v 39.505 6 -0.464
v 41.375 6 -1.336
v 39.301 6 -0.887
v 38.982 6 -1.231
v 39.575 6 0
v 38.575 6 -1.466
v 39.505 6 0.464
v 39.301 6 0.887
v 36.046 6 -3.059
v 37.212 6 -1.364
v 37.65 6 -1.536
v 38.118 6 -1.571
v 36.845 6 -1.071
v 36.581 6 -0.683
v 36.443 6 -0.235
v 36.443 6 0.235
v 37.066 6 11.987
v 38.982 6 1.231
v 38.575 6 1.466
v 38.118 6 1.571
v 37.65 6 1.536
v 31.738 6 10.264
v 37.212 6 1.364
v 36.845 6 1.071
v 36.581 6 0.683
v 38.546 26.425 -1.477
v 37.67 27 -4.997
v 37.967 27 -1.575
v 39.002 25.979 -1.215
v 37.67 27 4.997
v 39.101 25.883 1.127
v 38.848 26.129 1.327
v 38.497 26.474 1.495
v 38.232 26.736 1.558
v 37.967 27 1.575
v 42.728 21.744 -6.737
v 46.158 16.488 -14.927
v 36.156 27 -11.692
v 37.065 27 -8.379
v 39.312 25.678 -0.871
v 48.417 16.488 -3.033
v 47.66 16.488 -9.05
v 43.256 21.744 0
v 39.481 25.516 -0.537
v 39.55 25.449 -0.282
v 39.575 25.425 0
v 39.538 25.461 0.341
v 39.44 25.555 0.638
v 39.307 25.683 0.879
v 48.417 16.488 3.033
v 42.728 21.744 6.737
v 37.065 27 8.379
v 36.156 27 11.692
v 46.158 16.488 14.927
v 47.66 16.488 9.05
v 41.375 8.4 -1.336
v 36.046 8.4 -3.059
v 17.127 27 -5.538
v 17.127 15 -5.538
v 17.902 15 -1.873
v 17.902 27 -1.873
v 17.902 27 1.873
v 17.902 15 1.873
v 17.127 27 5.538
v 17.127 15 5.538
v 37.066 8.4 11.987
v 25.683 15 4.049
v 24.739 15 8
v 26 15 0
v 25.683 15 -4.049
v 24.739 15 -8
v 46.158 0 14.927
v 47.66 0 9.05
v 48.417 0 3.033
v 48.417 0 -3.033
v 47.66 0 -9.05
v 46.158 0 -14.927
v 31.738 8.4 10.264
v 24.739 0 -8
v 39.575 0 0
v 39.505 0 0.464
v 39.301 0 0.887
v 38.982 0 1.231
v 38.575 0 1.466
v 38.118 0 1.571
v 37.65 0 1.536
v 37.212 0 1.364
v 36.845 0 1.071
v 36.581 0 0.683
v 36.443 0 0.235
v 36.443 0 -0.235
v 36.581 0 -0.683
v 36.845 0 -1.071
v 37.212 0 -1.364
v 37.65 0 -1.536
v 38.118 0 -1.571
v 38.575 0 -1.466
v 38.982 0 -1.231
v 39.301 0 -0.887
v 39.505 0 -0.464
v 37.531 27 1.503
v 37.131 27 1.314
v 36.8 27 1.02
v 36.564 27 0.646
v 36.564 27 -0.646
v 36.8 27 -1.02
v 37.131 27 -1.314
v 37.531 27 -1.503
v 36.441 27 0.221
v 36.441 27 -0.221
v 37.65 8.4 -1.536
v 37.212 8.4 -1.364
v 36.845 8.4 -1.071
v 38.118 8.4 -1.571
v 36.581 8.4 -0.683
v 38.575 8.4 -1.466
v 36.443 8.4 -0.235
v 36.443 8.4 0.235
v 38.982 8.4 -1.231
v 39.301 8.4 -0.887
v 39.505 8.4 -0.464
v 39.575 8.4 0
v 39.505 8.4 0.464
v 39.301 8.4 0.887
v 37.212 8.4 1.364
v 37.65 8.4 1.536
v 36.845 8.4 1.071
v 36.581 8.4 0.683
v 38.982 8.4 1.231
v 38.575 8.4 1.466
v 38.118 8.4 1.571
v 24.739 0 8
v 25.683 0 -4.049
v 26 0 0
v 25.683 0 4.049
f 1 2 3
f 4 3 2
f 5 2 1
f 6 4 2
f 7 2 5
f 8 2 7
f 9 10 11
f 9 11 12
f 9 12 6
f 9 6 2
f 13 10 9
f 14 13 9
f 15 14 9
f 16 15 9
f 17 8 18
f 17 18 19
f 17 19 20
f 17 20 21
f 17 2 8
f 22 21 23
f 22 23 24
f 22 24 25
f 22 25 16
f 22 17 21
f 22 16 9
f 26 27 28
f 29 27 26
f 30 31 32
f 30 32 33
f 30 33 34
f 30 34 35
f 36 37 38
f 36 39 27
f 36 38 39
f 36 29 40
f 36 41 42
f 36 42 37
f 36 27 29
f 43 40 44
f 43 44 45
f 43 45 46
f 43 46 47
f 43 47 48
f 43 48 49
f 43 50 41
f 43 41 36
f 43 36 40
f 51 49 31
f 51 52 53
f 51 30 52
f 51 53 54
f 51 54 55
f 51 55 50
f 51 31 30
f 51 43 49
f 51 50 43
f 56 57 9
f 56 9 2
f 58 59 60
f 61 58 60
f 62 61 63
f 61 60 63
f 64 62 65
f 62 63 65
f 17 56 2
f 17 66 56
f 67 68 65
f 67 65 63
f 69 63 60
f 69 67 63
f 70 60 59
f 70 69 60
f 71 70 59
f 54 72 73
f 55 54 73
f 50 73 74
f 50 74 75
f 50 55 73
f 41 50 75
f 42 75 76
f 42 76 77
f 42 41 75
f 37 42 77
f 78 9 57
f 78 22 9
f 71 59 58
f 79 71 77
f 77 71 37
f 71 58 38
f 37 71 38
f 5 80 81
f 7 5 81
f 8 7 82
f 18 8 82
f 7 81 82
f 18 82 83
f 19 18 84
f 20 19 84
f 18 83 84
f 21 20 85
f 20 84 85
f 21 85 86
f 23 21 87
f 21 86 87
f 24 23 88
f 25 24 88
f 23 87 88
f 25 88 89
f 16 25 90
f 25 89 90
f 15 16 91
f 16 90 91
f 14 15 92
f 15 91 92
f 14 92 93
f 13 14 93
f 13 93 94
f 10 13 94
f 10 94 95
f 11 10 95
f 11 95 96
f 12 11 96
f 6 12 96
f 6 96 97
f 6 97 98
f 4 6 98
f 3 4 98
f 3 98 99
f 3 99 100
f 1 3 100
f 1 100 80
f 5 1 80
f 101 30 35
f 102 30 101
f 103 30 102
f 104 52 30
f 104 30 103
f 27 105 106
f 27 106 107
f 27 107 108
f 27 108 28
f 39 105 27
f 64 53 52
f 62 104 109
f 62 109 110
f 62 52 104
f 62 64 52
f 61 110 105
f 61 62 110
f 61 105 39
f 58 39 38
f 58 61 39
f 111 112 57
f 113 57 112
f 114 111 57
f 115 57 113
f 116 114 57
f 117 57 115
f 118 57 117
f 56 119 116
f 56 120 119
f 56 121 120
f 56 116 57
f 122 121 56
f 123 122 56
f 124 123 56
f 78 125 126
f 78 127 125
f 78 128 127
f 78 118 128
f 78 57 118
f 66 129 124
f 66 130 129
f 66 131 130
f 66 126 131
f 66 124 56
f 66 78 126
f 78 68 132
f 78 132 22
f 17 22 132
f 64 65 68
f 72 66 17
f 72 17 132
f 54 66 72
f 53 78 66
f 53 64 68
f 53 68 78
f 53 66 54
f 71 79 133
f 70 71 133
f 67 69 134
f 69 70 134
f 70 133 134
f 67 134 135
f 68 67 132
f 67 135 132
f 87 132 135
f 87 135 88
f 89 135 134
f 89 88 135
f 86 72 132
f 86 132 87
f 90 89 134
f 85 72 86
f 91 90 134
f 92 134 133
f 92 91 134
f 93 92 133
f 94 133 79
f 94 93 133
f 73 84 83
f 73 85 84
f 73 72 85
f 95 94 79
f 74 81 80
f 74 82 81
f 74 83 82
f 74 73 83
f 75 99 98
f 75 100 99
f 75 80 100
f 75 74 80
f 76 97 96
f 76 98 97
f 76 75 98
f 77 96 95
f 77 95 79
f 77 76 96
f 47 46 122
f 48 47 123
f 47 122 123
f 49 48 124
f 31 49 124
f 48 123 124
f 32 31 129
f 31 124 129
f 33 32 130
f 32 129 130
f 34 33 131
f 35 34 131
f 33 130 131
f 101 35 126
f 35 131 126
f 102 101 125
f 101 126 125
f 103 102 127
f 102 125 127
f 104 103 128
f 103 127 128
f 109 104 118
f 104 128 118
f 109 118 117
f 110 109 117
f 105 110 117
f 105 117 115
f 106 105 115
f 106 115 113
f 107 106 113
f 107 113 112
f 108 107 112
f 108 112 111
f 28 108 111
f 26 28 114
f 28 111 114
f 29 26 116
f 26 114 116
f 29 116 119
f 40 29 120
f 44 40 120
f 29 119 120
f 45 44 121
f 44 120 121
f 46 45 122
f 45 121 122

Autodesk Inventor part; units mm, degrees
ref_plane "YZ Plane" through (0, 0, 0) normal (1, 0, 0) x (0, 1, 0)
ref_plane "XZ Plane" through (0, 0, 0) normal (0, 1, 0) x (-1, 0, 0)
ref_plane "XY Plane" through (0, 0, 0) normal (0, 0, 1) x (1, 0, 0)
sketch "Эскиз3" plane through (0, 0, 0) normal (0, 0, 1) x (1, 0, 0)
  line L0 (26, 0) -> (48.5118, 0)
  line L1 (48.5118, 0) -> (48.5118, 16.4882)
  line L2 (26, 15) -> (18, 15)
  line L3 (18, 15) -> (18, 27)
  line L4 (18, 27) -> (38, 27)
  line L5 (38, 27) -> (48.5118, 16.4882)
  line L6 (38, 27) -> (52.866, 27) construction
  line L7 (26, 15) -> (26, 0)
  dimension "d18" = 14.866
  dimension "d19" = 45
  dimension "d20" = 20
  dimension "d25" = 8
sketch "Эскиз4" plane through (0, 0, 0) normal (0, 1, 0) x (-1, 0, 0)
  arc A0 (-24.7386, 8) -> (-24.7386, -8) centre (0, 0) ccw
  dimension "d31" = 26
sweep "Сдвиг1" add profiles "Эскиз3" path "Эскиз4"
sketch "Эскиз5" plane through (0, 0, 0) normal (0, -1, 0) x (1, 0, 0)
  arc A0 (36.1565, 11.6923) -> (36.1565, -11.6923) centre (0, 0) ccw projected
  circle A1 centre (38, 0) radius 1.575
  point P0 (0, 0)
  dimension "d27" = 3.15
extrude "Выдавливание2" cut sketch "Эскиз5" against normal up to surface (27 mm away)
sketch "Эскиз7" plane through (46.1583, 0, 14.9267) normal (-0.3076923, 0, 0.9514859) x (0.9514859, 0, 0.3076923)
  line L0 (-13.9304, 0) -> (-13.9304, 27) projected
  line L1 (-10.7804, 0) -> (-10.7804, 25.4984) projected
  line L2 (-13.9304, 0) -> (-10.7804, 0)
  line L3 (-12.3554, 12.4) -> (-12.3554, 0) construction
  line L4 (-22.5118, 0) -> (0, 0) projected
  line L5 (-15.1554, 8.4) -> (-9.5554, 8.4)
  line L6 (-9.5554, 8.4) -> (-9.5554, 6)
  line L7 (-9.5554, 6) -> (-15.1554, 6)
  line L8 (-15.1554, 6) -> (-15.1554, 8.4)
  line L9 (-9.5554, 6) -> (-15.1554, 8.4) construction
  point P0 (-48.5118, 0)
  point P1 (-12.3554, 7.2)
  dimension "d35" = 5.6
  dimension "d36" = 2.4
  dimension "d37" = 1.575
  dimension "d38" = 6
extrude "Выдавливание3" cut sketch "Эскиз7" against normal blind 14 contours L7 L8 L5 L0 | L0 L5 L1 L7 | L1 L5 L6 L7
